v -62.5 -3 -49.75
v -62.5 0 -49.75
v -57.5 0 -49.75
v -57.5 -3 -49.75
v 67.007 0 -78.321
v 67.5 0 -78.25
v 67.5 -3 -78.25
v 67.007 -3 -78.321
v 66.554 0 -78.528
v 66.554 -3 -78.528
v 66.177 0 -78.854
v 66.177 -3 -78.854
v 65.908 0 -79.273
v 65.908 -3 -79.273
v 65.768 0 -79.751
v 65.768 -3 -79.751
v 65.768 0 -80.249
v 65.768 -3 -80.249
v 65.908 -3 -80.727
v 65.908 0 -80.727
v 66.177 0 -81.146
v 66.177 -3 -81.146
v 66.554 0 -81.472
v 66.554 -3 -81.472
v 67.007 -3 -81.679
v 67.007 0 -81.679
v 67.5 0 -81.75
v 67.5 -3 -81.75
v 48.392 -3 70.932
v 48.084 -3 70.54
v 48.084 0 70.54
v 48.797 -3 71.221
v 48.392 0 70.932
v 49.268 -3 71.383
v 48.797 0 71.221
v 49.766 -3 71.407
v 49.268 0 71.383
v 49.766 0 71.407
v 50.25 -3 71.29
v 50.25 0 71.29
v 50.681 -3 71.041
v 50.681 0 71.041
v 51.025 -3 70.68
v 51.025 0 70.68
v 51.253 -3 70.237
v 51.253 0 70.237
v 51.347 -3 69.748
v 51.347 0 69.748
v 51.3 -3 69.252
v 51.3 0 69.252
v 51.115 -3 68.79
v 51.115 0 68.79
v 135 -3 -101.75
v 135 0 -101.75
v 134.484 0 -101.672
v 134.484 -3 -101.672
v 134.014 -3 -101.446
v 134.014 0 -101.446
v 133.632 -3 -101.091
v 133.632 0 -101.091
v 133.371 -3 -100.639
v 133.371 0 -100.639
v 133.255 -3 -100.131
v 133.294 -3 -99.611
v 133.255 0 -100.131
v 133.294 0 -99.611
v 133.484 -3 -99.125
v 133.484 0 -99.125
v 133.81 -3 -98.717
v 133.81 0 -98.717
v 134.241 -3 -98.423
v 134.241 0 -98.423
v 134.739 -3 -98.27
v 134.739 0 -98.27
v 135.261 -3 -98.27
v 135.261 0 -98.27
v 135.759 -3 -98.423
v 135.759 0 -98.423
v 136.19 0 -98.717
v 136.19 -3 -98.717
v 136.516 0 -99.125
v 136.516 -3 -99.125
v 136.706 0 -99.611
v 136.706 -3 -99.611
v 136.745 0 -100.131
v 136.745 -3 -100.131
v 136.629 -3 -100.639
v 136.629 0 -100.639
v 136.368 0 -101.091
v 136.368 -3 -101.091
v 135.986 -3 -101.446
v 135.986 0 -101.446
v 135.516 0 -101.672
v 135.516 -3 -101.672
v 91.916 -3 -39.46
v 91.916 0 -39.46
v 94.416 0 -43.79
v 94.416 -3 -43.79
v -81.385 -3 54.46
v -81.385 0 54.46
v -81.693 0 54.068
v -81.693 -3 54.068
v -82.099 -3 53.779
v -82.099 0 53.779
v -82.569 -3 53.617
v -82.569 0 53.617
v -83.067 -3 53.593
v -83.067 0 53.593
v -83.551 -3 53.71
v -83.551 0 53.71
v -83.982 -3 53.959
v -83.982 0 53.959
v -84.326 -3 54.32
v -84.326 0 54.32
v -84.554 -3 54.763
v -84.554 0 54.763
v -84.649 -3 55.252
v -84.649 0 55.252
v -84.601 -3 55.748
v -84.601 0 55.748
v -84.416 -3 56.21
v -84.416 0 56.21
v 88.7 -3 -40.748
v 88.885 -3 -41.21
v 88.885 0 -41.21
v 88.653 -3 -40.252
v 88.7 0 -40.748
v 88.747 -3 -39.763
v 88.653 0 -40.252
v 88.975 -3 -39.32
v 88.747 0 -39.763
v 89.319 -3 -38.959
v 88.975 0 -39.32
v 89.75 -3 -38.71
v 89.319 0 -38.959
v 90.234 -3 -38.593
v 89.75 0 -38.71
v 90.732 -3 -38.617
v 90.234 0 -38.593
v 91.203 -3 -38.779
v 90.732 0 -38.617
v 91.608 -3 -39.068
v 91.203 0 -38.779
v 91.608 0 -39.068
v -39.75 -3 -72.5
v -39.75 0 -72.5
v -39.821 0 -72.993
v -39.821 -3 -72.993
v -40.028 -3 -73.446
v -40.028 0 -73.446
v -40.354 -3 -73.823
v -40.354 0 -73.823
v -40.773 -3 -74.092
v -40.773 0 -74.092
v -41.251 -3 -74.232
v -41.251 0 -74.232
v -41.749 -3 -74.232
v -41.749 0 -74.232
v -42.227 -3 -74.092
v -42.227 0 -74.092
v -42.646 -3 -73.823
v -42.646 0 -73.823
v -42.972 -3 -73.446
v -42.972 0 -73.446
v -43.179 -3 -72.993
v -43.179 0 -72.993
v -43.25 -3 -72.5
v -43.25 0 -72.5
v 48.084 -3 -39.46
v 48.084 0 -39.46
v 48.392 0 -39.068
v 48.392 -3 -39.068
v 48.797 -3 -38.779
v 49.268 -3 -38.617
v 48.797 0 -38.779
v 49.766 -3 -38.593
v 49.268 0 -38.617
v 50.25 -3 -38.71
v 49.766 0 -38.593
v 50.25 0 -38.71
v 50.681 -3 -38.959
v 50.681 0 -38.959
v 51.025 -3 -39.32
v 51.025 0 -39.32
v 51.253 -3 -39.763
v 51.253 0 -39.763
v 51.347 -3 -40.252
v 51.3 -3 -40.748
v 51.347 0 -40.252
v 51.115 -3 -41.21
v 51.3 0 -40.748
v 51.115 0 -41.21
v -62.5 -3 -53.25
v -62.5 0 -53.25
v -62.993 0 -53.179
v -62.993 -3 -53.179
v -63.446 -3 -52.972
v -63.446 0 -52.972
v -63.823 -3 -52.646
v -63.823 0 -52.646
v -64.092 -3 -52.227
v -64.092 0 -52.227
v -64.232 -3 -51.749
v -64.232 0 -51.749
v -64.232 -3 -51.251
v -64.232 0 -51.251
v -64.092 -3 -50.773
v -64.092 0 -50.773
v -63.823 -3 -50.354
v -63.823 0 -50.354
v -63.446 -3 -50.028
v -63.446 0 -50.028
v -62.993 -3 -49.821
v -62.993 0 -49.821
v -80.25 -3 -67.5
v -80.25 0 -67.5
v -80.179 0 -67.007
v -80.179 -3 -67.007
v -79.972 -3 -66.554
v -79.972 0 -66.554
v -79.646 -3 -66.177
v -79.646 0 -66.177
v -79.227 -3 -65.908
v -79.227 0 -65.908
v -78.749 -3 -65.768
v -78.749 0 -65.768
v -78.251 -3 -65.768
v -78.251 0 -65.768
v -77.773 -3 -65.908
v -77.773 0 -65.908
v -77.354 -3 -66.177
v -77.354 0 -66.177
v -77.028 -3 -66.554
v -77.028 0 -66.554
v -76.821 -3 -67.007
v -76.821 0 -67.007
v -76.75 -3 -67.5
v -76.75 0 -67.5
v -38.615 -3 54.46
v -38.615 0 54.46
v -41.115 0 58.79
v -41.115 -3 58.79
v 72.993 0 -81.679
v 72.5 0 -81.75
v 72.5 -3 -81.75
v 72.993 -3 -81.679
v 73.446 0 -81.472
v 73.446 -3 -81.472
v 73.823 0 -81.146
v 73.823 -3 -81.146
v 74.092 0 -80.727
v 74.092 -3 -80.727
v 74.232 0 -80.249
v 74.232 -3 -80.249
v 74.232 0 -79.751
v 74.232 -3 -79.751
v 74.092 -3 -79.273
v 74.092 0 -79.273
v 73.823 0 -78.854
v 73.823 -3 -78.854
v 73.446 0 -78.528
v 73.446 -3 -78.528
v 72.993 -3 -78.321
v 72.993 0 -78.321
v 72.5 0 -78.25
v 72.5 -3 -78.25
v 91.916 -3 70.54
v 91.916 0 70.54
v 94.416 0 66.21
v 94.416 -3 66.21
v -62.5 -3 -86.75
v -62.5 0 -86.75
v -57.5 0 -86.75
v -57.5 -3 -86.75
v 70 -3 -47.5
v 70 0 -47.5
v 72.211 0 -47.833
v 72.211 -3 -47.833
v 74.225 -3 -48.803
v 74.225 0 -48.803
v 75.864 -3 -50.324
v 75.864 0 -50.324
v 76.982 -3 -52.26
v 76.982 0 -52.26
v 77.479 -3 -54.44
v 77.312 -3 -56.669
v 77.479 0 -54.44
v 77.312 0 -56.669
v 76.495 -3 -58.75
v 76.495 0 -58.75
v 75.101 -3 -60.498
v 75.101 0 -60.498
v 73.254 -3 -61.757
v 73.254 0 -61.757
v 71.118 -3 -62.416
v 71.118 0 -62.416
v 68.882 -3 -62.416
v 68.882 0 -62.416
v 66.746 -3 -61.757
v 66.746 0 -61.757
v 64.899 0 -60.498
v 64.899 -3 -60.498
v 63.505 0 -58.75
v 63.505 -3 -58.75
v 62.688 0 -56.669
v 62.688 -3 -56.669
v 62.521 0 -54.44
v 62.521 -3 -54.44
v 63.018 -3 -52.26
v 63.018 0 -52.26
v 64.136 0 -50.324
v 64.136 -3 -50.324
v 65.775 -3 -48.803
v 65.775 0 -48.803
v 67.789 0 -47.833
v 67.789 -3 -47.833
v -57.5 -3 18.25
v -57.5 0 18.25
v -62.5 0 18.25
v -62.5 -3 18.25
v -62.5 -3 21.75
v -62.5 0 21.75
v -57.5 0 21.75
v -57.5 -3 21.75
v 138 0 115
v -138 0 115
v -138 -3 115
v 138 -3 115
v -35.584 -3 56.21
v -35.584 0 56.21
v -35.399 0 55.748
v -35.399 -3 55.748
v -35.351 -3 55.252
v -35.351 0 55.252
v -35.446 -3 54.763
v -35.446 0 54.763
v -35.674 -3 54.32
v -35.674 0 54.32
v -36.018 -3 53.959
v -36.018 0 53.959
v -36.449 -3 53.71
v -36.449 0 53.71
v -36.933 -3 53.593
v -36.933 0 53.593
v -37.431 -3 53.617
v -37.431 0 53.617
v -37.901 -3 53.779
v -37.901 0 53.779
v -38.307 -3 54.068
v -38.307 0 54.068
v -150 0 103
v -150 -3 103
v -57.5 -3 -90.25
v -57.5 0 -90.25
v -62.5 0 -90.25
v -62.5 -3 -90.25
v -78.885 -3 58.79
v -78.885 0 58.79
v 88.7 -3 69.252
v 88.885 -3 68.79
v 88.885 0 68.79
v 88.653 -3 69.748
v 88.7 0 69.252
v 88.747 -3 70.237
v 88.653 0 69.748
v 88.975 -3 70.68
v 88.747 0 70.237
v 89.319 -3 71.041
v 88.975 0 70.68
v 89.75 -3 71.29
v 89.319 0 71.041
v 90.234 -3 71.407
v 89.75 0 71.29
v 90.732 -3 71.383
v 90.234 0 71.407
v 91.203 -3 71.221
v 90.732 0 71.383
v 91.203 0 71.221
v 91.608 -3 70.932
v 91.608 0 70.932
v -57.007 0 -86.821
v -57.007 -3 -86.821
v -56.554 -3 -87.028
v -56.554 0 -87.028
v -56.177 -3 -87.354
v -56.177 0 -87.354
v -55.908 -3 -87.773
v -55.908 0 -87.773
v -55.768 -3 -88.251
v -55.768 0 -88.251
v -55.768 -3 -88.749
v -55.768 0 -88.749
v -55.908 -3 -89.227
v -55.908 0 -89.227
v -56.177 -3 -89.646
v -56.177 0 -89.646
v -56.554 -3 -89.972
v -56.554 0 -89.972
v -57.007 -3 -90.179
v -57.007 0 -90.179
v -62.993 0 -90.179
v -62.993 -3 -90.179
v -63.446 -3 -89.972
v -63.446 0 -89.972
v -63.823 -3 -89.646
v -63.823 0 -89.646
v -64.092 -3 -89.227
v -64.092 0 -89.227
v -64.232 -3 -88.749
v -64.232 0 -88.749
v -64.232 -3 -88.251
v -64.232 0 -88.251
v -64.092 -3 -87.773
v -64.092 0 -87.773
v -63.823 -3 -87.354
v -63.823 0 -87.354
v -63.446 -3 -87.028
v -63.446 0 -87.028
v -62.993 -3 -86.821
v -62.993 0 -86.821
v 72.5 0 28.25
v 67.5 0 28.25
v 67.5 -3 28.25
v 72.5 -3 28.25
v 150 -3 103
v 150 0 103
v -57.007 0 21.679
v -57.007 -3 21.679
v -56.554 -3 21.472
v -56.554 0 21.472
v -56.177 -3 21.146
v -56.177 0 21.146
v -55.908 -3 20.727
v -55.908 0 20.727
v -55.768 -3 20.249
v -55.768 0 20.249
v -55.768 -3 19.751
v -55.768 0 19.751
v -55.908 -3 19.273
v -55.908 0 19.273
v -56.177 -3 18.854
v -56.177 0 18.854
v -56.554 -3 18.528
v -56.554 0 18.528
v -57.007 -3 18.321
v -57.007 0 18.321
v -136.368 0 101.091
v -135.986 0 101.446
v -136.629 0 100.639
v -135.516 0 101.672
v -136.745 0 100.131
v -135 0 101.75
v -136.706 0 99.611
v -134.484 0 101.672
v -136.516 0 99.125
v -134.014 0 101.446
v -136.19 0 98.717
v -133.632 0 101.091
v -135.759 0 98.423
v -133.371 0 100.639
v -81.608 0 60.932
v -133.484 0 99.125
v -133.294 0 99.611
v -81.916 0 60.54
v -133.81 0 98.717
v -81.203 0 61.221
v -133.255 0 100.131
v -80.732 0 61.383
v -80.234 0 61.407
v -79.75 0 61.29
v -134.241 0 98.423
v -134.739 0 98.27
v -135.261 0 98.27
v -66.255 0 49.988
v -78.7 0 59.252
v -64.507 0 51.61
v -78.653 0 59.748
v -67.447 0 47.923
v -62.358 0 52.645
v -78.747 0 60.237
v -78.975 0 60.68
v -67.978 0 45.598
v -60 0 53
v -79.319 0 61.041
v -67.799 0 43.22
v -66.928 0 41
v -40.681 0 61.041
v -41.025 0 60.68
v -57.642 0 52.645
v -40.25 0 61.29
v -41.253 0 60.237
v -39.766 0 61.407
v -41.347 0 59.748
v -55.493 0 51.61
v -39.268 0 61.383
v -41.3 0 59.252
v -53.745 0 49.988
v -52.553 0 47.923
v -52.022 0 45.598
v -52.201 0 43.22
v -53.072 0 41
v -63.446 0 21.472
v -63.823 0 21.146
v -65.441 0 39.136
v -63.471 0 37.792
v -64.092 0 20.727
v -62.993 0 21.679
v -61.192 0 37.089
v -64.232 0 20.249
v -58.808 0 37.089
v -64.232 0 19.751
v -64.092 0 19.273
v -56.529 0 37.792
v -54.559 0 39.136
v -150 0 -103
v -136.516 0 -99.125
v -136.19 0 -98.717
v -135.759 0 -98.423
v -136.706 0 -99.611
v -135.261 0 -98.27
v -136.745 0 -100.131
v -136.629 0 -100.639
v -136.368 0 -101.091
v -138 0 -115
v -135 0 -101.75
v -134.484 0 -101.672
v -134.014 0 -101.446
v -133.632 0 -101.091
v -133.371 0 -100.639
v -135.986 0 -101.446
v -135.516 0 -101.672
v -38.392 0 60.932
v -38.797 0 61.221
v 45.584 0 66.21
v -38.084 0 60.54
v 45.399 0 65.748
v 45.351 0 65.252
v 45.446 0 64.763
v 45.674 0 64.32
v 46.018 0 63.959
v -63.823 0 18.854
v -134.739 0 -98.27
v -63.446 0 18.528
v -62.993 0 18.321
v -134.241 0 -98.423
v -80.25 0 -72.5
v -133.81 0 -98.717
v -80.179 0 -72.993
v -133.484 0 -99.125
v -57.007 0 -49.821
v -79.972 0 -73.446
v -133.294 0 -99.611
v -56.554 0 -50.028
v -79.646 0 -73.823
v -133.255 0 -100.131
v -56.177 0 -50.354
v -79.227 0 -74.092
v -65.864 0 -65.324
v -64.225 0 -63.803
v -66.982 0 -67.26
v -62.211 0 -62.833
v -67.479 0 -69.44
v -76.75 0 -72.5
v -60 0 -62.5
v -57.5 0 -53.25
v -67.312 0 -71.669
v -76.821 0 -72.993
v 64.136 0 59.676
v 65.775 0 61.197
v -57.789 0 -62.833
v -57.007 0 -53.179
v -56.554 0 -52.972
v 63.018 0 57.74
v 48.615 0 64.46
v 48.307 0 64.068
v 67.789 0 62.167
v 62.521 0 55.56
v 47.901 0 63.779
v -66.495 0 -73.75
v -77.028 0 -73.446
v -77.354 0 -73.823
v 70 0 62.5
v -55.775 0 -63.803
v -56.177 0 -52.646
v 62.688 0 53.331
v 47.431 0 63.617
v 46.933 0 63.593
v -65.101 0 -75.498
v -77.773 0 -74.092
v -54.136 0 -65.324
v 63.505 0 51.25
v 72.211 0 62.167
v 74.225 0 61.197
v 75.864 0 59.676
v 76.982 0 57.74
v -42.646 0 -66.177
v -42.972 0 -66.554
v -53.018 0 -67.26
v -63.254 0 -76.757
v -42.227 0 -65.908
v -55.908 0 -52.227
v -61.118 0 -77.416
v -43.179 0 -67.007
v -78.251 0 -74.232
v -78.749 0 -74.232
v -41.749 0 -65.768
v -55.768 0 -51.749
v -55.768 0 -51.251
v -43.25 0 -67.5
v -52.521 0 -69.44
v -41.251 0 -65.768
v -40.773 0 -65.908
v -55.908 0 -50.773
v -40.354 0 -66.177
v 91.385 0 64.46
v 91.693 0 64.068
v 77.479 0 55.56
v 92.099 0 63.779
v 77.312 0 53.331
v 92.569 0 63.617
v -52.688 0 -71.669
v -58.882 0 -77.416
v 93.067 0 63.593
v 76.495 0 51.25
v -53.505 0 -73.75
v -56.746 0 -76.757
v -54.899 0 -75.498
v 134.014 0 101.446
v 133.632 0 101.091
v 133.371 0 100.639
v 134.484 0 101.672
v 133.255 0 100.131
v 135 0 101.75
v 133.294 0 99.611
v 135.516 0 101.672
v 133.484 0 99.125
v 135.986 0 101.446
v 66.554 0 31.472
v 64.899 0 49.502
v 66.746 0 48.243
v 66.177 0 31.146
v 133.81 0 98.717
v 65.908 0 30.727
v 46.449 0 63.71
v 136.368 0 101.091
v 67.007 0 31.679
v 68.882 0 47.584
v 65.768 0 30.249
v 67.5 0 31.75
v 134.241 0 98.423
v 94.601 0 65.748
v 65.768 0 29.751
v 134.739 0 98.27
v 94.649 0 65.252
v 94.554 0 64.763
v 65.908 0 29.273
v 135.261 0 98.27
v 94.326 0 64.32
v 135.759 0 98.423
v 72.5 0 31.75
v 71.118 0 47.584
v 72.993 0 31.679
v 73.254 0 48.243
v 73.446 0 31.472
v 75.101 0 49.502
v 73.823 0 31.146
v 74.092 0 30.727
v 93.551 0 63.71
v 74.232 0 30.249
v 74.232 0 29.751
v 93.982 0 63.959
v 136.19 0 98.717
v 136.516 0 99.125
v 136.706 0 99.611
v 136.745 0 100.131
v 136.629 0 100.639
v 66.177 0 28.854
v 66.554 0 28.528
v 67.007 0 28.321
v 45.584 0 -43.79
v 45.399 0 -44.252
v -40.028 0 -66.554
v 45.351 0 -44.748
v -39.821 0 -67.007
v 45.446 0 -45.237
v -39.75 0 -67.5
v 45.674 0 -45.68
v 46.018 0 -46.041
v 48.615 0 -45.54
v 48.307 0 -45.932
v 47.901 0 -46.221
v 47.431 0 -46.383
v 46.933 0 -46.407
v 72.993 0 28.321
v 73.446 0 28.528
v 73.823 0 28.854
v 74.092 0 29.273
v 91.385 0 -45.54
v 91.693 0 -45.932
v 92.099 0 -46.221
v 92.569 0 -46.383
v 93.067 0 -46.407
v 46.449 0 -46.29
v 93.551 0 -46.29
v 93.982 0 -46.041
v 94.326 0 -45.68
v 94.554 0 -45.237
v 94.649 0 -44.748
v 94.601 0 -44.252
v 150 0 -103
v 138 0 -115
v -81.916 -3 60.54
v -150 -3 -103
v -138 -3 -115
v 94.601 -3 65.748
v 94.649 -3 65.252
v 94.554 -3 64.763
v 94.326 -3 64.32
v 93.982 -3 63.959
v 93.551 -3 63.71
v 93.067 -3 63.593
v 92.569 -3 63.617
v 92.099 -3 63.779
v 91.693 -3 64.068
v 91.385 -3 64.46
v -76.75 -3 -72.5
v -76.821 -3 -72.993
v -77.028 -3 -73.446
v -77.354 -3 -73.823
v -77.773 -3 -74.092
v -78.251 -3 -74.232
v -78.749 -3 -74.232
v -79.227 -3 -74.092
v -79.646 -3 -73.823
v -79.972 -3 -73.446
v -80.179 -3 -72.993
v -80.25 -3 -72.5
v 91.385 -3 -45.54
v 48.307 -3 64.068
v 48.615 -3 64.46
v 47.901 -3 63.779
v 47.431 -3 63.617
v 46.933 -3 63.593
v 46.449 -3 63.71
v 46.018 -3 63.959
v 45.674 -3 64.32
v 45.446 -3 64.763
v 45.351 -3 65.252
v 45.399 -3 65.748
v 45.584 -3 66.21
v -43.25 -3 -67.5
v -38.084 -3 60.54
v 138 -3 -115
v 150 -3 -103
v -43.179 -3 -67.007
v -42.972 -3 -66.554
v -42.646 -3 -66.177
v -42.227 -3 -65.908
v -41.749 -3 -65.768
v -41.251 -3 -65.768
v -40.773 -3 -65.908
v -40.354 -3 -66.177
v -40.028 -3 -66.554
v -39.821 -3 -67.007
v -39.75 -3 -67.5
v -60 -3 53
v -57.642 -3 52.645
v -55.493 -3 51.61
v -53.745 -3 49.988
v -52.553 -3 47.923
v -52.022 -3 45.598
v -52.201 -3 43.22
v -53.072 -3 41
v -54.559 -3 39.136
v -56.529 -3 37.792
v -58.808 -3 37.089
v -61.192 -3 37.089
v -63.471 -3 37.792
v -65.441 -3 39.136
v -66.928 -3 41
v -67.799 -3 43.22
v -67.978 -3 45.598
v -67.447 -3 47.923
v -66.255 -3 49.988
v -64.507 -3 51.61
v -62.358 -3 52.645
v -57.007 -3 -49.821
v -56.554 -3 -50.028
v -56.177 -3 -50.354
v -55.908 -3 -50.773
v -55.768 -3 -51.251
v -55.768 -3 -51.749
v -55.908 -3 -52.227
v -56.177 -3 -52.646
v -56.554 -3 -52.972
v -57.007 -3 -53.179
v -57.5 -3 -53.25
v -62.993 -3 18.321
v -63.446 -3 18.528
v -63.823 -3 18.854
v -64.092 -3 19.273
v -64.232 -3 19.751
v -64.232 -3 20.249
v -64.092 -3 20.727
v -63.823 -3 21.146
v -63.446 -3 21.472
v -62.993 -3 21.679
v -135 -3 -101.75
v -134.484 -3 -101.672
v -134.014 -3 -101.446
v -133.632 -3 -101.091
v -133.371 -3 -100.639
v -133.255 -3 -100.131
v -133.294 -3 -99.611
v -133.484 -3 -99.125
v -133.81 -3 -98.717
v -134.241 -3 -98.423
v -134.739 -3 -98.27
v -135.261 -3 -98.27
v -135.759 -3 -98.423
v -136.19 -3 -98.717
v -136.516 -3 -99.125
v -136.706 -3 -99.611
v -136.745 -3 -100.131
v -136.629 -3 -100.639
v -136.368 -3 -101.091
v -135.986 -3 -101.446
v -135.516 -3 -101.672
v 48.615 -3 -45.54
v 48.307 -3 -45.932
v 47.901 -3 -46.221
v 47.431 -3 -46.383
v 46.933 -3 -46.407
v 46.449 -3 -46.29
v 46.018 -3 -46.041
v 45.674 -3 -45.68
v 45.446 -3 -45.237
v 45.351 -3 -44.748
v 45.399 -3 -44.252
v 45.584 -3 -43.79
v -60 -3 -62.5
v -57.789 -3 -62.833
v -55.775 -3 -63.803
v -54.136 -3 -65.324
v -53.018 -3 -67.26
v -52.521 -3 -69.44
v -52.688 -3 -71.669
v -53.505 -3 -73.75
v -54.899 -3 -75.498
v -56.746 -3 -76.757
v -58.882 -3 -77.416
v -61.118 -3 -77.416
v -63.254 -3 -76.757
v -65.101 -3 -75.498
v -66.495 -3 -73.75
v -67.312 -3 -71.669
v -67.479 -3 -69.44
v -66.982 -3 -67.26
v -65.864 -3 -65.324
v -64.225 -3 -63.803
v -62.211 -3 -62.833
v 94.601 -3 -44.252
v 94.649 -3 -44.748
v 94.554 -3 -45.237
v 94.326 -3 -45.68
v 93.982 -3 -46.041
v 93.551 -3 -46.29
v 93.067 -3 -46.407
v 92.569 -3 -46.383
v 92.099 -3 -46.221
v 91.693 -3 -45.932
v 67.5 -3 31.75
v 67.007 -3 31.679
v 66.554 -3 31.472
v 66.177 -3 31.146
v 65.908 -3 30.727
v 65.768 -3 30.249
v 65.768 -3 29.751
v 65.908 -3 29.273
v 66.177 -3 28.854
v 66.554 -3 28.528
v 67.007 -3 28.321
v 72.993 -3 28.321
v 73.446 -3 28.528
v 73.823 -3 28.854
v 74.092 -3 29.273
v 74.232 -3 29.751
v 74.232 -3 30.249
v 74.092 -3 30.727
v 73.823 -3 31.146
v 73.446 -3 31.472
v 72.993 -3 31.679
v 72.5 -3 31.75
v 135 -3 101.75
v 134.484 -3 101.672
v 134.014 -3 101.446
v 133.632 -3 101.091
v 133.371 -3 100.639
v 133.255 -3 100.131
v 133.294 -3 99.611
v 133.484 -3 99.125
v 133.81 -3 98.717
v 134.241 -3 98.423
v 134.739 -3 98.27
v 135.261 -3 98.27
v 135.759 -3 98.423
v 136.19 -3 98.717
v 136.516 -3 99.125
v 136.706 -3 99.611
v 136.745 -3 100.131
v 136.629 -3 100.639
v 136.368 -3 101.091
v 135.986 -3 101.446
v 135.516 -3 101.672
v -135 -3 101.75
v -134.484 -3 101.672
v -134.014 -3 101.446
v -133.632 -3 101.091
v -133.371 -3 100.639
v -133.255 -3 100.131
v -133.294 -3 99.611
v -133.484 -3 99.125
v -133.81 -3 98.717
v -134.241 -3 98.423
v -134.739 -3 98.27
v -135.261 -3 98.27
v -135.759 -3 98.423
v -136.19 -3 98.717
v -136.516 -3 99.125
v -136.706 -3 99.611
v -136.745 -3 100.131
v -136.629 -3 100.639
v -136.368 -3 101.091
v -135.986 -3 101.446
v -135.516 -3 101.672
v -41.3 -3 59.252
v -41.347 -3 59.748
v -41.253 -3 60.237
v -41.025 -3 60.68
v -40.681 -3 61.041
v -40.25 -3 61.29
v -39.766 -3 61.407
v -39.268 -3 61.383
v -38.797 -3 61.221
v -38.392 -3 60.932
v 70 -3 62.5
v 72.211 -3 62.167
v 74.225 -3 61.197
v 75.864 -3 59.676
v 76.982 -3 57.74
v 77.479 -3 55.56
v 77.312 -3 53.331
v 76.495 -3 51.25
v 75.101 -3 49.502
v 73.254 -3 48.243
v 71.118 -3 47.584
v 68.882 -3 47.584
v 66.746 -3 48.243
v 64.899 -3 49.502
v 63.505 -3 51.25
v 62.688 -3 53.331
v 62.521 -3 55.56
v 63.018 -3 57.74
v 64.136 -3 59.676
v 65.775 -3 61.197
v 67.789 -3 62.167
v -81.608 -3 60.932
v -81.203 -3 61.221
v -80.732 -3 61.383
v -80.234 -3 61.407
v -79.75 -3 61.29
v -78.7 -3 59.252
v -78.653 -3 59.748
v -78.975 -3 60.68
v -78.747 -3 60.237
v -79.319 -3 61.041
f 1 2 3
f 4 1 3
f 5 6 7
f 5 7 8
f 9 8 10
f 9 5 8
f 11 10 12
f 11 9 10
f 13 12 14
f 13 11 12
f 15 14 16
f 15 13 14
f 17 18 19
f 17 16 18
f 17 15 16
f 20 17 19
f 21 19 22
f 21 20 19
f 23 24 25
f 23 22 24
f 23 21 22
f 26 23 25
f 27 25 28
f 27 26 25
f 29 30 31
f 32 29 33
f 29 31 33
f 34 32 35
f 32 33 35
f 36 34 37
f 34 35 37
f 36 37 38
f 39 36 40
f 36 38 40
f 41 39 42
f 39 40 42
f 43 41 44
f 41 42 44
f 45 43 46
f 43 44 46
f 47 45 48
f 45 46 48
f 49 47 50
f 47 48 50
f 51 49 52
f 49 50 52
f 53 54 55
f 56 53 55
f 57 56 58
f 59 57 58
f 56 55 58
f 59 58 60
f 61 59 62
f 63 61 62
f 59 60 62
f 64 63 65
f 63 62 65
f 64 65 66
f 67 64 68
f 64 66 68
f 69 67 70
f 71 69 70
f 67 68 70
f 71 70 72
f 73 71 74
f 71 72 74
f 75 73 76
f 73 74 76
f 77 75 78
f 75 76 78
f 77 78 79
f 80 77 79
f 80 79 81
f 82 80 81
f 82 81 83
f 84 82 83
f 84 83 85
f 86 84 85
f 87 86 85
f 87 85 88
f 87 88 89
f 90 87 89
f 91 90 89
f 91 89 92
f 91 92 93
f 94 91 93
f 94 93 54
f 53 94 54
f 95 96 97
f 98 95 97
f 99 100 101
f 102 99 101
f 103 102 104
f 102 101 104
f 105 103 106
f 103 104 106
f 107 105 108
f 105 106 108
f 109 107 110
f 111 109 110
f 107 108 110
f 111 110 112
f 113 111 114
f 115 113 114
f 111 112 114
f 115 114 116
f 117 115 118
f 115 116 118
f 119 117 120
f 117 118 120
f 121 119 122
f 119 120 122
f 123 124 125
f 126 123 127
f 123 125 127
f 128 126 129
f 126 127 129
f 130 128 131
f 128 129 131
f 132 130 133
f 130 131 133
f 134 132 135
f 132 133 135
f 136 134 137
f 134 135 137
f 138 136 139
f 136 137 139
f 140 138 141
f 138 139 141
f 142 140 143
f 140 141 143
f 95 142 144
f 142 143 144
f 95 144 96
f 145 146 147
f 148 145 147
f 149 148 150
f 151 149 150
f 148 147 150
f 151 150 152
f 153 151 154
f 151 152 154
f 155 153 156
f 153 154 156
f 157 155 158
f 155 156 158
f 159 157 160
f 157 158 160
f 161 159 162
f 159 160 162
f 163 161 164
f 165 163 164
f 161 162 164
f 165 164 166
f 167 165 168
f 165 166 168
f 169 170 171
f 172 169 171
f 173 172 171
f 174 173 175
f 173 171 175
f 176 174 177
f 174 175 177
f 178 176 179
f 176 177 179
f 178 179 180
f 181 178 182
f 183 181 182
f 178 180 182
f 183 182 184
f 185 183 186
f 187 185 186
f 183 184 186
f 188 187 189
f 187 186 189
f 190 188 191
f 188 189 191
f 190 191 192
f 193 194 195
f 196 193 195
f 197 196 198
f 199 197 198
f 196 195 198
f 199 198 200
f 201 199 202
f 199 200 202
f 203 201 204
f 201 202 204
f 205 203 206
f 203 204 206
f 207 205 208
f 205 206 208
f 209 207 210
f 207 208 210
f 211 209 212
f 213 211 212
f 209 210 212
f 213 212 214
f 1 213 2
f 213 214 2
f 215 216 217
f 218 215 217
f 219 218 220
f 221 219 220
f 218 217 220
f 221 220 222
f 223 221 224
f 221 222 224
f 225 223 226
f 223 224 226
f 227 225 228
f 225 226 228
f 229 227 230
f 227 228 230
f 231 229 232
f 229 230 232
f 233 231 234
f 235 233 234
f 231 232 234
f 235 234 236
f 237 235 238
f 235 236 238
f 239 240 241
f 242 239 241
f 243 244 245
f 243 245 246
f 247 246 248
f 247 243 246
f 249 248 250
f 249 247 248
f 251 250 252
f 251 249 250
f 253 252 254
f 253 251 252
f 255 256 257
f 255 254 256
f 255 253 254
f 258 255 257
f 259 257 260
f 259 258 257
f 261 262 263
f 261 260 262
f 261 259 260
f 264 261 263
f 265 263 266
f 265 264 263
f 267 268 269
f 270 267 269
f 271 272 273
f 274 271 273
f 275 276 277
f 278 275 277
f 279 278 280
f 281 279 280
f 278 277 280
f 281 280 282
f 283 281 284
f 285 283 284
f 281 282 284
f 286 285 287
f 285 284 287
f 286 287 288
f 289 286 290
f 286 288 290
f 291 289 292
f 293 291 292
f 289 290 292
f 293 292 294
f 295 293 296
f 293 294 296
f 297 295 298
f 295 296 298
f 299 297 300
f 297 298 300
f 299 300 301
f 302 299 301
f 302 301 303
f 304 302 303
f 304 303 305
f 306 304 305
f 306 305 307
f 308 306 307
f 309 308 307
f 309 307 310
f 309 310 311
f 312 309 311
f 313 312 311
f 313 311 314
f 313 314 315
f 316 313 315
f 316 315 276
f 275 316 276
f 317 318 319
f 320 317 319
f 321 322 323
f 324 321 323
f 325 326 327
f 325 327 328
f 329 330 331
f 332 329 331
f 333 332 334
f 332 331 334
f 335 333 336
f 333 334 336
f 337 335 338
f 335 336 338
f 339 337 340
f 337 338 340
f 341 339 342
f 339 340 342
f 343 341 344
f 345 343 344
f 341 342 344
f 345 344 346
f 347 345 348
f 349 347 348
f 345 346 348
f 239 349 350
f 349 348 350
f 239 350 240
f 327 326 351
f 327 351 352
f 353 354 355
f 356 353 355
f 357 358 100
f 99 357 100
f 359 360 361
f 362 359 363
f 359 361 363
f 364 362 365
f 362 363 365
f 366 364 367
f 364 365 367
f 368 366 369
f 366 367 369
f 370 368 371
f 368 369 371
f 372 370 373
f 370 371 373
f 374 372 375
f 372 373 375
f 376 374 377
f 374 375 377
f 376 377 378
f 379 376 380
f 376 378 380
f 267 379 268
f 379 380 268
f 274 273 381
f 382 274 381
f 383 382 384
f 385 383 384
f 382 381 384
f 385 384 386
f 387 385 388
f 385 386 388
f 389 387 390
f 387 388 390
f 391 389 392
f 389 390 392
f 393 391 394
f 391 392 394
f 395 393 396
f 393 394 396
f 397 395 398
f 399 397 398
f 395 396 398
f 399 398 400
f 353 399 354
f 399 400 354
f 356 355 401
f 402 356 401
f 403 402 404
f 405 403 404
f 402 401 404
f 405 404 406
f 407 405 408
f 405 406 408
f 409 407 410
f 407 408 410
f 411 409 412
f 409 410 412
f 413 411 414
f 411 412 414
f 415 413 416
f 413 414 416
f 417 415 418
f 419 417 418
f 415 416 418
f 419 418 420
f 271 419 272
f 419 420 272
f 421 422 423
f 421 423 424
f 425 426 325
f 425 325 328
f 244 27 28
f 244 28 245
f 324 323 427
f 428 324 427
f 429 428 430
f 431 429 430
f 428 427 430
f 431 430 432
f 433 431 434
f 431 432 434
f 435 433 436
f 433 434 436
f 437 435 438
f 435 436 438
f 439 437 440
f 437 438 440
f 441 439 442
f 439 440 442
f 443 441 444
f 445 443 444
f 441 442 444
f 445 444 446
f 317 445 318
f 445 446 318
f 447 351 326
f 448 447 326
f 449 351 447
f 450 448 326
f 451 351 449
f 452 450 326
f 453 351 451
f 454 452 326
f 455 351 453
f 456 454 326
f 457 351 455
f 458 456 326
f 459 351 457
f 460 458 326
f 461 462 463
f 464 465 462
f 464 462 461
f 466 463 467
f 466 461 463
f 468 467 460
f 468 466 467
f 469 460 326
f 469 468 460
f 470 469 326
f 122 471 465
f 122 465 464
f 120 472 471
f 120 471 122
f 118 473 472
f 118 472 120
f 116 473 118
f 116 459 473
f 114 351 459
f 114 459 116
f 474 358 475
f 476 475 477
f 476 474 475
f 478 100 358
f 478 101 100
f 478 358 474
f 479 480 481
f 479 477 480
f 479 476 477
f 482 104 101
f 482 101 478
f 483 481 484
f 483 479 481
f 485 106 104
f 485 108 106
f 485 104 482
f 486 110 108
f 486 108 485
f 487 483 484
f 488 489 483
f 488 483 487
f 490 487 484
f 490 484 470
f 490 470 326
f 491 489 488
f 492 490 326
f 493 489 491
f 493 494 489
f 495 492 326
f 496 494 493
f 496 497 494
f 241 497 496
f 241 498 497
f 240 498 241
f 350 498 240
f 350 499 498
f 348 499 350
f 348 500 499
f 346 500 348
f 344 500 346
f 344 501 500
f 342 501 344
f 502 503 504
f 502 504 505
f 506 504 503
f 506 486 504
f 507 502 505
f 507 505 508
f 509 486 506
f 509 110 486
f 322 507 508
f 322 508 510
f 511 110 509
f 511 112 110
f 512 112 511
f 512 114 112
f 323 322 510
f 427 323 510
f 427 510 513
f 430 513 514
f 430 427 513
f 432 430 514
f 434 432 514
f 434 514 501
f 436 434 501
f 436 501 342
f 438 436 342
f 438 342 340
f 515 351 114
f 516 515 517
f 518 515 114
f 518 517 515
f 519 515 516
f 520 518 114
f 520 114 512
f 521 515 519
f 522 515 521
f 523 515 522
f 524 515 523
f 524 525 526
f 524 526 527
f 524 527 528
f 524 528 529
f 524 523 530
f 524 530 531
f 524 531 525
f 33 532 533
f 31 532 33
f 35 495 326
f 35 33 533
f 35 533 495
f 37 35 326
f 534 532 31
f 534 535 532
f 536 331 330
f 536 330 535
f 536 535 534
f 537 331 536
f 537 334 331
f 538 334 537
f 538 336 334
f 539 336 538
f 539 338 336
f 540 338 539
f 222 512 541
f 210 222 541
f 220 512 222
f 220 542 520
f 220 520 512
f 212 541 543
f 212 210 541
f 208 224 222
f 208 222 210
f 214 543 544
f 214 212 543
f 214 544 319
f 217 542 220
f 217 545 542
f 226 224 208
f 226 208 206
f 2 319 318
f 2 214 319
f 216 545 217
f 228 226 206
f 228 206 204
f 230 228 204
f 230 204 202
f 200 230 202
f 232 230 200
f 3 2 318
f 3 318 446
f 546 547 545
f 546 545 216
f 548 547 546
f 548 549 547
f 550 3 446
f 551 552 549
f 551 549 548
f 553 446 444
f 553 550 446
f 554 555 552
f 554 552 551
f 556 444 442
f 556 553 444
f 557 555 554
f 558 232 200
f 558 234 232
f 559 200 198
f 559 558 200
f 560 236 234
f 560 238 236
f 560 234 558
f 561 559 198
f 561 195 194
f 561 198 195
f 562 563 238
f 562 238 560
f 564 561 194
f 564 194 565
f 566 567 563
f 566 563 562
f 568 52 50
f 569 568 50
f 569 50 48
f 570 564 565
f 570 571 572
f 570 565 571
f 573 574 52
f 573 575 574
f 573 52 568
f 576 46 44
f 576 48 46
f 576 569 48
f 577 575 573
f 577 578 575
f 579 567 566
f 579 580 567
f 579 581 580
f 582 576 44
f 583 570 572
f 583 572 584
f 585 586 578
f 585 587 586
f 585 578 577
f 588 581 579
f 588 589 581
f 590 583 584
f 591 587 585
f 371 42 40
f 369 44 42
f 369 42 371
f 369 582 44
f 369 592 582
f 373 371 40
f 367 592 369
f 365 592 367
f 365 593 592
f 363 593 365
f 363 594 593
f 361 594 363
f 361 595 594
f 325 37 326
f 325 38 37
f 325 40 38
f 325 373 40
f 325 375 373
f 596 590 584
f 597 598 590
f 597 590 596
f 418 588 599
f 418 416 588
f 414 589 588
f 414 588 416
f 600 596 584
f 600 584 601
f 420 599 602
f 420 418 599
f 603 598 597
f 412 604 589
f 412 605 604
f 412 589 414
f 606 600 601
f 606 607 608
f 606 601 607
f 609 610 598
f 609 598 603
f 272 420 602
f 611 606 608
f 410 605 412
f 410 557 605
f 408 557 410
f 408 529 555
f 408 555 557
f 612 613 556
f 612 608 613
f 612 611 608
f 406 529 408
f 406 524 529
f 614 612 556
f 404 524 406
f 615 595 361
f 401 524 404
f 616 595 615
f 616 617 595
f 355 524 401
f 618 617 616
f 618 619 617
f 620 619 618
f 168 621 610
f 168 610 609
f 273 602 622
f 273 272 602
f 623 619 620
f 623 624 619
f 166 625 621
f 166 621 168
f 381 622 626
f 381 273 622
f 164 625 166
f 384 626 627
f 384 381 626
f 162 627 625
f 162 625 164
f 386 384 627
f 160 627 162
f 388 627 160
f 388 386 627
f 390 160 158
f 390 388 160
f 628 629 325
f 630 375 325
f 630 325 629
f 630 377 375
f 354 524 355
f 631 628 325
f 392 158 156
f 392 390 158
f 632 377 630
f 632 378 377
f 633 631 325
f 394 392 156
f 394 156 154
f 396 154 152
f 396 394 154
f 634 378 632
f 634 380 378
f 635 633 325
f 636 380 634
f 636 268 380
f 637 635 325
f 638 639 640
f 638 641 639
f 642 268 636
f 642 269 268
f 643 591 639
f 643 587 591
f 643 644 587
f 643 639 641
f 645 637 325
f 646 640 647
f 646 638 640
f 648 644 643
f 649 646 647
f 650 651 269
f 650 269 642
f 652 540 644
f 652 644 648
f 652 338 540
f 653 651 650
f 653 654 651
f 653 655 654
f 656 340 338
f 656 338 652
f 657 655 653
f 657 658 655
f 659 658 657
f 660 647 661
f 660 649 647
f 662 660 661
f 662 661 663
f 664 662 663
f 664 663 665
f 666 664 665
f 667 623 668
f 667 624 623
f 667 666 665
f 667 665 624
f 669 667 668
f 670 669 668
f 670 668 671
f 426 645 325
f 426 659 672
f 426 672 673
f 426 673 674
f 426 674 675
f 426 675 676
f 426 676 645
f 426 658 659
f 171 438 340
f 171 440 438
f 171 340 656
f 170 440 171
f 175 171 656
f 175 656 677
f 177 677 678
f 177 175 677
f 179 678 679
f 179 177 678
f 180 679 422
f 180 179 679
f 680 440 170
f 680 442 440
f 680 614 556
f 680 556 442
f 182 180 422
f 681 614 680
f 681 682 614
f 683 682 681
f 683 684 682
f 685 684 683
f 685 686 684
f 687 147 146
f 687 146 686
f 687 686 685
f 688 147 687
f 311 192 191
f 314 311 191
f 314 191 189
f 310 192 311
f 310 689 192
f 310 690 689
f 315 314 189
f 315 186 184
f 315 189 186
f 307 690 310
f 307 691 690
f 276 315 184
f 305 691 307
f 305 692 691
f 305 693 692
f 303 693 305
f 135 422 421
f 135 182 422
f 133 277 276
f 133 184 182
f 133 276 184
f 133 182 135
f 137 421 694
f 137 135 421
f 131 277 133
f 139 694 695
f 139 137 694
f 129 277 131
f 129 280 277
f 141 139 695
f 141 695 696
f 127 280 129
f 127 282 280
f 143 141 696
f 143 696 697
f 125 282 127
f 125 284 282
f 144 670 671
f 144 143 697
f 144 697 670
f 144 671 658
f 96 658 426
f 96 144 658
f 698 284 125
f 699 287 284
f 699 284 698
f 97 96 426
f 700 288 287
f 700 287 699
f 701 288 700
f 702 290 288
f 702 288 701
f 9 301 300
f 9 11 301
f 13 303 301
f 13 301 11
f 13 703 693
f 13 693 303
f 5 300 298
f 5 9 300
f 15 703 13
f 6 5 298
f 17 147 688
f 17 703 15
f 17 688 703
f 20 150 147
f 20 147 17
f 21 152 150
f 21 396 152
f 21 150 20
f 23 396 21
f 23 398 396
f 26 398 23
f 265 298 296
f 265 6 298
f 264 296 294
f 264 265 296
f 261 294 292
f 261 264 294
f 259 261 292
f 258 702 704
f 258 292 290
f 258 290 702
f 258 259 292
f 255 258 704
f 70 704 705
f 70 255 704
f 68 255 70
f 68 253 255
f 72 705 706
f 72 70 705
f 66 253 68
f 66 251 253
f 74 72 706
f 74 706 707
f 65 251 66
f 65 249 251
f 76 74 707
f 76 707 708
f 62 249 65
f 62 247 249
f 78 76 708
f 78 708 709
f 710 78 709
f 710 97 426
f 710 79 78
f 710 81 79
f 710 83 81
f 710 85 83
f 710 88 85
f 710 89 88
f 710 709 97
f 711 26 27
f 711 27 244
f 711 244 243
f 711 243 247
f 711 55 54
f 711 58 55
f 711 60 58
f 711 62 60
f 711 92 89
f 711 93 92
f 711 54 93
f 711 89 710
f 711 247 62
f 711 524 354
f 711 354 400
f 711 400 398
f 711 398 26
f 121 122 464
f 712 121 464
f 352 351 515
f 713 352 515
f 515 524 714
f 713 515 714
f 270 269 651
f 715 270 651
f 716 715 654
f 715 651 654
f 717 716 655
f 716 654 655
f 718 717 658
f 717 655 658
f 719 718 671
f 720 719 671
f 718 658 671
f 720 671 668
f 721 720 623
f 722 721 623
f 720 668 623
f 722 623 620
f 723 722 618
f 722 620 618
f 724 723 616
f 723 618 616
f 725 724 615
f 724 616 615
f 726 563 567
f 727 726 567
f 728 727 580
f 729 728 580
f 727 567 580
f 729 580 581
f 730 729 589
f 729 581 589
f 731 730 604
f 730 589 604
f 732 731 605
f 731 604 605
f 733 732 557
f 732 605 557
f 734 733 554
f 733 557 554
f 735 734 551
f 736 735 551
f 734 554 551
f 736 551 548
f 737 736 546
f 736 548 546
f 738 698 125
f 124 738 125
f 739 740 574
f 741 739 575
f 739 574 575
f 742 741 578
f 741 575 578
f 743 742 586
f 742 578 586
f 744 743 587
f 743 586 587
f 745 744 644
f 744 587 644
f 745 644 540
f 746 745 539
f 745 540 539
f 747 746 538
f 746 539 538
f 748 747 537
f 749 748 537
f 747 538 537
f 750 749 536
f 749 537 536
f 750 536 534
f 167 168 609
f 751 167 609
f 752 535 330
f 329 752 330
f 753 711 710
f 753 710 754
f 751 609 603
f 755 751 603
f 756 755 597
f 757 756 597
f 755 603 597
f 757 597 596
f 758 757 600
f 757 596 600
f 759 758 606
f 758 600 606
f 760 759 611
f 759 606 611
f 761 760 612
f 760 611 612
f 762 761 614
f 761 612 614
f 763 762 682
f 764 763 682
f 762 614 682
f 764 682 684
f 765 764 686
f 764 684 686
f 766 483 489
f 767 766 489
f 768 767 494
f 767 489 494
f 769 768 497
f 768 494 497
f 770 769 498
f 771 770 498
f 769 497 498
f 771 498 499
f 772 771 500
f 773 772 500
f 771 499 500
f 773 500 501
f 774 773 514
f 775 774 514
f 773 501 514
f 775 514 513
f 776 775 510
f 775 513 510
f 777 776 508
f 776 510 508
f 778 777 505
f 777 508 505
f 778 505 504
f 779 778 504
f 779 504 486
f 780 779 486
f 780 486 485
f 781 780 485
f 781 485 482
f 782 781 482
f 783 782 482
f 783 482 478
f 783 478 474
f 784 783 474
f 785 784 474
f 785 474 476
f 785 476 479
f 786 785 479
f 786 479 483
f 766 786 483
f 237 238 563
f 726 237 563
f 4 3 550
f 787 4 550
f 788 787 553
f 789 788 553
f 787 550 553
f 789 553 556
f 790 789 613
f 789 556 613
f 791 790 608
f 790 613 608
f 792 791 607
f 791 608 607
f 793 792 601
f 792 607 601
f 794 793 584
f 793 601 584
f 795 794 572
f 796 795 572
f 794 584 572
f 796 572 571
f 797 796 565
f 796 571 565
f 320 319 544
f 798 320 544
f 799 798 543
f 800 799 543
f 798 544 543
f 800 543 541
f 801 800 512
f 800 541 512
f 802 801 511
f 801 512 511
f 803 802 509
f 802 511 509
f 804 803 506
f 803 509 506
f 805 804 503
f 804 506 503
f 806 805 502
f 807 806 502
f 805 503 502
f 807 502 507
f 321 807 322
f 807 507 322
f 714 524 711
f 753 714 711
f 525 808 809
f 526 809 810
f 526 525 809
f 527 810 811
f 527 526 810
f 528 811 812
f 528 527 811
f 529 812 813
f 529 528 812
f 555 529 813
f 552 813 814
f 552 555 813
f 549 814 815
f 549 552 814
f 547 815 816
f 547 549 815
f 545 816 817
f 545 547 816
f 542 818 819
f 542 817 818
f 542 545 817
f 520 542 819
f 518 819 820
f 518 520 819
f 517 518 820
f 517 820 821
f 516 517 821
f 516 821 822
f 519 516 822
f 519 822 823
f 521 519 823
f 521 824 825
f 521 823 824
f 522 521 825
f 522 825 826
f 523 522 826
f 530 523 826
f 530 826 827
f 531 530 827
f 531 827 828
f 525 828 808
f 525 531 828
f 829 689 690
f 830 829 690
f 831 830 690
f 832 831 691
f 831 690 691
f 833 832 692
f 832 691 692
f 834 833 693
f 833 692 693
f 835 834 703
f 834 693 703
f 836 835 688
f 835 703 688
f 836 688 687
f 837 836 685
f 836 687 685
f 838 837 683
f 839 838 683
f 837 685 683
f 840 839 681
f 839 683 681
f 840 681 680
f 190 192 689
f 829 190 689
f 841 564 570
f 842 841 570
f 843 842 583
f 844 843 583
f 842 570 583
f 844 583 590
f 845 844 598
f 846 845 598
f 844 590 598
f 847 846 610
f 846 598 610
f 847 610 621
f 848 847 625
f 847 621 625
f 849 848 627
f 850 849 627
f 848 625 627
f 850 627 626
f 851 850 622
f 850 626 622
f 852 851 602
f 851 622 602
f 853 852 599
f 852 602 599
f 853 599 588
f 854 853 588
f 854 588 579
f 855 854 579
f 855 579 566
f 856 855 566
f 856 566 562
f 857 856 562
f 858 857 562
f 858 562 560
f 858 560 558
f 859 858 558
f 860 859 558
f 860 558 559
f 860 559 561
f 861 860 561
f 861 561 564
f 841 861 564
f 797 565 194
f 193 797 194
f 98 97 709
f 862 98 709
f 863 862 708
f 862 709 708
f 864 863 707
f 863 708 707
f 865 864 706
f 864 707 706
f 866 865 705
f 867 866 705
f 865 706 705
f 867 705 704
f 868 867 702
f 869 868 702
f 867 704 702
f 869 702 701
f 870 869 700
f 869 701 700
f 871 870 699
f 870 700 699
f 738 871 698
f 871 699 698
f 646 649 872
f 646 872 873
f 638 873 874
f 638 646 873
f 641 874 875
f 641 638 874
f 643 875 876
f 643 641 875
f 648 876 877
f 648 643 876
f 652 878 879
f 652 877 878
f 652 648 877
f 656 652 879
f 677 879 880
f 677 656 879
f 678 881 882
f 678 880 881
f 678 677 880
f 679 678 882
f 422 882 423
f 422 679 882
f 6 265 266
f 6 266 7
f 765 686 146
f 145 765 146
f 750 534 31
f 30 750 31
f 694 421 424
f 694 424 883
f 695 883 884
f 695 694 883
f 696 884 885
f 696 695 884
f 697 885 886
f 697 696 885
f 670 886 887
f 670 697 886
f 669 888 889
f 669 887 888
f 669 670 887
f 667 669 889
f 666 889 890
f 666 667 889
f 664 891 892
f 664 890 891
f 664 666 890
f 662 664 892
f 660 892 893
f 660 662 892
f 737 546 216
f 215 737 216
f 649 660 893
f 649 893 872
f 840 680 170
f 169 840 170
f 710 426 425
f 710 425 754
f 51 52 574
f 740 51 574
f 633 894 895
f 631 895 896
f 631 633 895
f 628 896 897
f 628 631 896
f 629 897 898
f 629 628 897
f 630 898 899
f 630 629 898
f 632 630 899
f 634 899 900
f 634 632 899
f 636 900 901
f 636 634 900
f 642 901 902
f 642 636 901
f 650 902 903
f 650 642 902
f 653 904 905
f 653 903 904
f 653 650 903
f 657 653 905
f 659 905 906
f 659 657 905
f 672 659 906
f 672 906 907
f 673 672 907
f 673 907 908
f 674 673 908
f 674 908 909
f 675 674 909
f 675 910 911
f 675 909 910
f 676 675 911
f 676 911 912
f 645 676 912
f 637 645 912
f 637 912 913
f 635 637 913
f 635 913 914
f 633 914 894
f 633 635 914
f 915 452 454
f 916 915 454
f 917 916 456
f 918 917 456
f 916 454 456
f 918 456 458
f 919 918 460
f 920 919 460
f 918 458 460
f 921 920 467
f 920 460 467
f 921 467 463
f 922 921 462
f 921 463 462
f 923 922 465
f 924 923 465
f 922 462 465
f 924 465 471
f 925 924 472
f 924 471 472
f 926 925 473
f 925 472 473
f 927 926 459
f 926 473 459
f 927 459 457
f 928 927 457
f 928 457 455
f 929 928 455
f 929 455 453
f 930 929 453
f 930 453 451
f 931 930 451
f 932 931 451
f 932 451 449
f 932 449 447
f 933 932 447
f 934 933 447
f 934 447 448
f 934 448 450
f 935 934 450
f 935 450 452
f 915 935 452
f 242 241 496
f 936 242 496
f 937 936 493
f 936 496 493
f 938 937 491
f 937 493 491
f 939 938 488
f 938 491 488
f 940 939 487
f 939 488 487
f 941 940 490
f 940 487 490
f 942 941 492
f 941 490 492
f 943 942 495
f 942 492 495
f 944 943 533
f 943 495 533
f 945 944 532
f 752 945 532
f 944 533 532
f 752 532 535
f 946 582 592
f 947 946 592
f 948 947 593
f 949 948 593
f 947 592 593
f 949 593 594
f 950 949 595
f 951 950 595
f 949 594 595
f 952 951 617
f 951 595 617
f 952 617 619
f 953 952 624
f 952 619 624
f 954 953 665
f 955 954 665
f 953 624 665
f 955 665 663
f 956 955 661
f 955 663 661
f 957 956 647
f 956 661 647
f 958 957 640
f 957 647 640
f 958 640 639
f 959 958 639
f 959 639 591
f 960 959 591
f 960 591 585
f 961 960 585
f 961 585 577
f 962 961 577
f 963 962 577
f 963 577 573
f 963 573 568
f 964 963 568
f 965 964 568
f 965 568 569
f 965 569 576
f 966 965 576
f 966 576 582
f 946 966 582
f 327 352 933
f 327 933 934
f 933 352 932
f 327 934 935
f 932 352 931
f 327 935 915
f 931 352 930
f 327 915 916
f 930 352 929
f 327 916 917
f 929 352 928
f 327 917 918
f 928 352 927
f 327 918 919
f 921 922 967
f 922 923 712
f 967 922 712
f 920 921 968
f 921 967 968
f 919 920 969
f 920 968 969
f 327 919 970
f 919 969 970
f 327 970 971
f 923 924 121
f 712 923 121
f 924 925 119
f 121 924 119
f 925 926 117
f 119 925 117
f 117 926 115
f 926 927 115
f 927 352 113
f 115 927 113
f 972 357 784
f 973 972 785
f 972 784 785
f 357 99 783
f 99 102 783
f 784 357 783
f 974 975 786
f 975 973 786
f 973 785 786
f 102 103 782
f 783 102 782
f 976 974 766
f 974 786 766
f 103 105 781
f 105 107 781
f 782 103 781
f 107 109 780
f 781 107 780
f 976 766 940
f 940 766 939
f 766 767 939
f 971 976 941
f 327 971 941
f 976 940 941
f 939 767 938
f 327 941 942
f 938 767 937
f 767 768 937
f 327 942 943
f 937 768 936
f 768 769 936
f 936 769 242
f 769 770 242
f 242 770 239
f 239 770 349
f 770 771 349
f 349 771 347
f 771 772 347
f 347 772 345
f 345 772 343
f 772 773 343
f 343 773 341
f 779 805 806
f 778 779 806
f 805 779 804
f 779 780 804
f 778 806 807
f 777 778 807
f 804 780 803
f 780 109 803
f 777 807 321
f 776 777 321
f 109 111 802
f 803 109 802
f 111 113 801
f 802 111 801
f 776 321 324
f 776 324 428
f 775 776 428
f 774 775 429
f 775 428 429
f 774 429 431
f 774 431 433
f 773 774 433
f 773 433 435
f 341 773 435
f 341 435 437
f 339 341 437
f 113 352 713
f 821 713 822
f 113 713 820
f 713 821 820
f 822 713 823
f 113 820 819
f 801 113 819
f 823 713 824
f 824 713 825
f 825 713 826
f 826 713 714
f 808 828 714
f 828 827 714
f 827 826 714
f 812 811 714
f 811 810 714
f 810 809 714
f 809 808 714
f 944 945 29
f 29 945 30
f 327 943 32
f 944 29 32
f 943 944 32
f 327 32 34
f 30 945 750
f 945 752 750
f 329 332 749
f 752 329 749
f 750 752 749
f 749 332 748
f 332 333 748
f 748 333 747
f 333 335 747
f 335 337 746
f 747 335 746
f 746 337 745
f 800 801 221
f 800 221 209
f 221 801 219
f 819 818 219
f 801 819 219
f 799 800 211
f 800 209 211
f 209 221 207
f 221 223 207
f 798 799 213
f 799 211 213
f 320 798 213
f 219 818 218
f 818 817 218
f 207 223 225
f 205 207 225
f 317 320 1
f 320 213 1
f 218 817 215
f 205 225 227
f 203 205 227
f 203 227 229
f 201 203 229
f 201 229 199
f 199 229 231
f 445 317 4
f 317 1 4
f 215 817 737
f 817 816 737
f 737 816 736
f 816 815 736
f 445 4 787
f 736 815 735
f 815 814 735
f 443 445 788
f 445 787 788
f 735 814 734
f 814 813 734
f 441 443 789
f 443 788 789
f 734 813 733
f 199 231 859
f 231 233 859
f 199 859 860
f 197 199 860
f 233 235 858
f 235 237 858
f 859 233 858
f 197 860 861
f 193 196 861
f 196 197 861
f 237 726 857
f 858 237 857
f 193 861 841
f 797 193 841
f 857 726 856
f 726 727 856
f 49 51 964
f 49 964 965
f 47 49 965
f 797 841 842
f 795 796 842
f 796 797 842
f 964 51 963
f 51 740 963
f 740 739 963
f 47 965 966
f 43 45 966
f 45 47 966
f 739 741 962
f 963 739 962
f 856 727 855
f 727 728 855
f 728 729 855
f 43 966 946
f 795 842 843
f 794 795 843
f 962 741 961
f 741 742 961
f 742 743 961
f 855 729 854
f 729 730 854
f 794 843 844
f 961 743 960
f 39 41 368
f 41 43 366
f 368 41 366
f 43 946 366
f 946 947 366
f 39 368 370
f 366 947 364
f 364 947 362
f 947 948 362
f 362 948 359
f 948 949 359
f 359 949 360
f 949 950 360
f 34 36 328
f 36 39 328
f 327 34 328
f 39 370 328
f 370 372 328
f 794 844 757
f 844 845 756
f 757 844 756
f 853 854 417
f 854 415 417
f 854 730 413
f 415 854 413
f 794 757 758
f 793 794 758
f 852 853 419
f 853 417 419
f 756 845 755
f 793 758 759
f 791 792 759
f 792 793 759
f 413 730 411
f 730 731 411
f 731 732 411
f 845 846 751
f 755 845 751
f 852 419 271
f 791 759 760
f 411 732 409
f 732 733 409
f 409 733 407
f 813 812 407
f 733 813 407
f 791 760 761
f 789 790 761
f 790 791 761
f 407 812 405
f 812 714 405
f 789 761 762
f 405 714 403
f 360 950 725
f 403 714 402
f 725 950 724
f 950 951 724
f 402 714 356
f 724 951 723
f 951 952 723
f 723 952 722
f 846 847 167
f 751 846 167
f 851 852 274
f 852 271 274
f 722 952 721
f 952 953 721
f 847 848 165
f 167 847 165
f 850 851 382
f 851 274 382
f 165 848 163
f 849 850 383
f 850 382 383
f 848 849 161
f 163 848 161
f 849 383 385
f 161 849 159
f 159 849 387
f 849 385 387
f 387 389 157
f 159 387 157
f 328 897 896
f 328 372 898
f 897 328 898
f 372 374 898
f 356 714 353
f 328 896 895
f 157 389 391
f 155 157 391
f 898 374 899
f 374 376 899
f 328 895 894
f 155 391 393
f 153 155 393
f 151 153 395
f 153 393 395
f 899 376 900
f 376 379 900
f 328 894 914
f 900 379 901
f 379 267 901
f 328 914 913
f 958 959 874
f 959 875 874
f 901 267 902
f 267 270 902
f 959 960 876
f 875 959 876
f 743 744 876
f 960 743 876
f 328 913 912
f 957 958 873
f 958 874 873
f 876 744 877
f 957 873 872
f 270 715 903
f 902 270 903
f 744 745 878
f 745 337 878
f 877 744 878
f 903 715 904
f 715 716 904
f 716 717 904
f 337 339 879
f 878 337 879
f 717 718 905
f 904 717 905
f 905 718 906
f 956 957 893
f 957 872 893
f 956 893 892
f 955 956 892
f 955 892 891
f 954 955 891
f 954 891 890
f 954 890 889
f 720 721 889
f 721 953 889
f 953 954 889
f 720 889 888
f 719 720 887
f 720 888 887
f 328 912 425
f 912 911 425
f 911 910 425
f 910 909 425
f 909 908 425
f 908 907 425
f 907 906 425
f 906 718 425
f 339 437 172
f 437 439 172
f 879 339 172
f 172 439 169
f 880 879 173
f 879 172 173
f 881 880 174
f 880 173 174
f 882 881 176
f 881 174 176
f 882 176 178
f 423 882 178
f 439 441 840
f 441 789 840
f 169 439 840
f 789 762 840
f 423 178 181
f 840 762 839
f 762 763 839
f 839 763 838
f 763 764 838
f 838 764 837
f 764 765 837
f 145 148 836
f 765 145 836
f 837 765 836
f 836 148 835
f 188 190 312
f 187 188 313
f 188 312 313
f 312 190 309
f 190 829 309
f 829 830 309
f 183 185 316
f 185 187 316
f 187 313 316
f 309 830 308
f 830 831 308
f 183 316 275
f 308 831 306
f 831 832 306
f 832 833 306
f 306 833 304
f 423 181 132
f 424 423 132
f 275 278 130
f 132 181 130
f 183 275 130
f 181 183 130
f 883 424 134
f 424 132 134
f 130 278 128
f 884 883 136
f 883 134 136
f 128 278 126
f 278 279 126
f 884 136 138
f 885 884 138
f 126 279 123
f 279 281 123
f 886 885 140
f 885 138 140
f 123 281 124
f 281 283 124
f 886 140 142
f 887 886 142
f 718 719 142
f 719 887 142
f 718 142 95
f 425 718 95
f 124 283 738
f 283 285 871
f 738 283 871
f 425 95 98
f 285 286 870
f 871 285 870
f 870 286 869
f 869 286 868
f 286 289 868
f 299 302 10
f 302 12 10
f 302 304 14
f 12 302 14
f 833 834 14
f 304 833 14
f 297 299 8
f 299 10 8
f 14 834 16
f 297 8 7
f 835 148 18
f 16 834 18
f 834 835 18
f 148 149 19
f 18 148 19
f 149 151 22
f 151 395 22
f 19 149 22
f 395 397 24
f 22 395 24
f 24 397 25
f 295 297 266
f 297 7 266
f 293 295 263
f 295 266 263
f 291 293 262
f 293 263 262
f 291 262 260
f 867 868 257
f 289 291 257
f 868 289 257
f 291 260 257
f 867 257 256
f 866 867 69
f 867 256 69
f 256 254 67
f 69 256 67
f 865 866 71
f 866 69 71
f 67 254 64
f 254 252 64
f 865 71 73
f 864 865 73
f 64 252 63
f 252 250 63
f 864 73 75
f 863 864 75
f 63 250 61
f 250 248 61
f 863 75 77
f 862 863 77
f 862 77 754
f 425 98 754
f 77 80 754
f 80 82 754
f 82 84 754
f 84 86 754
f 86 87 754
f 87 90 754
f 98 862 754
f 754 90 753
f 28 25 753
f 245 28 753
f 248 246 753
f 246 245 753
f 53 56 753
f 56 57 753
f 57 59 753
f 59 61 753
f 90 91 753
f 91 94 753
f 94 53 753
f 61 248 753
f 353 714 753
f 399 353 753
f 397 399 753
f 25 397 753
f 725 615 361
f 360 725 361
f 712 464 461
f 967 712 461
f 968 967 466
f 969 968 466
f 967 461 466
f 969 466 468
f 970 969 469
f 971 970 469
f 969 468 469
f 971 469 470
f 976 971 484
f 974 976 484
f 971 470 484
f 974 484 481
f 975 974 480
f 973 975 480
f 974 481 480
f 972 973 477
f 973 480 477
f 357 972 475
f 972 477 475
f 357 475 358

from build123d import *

# Parameters (mm, degrees)
ESBO_O1_W                 = 300
ESBO_O1_H                 = 230
RESSALTO_EXTRUS_O1_DEPTH  = 3
CHANFRO1_SIZE             = 12
ESBO_O4_R                 = 8
ESBO_O4_R_2               = 7.5
CORTE_EXTRUS_O1_DEPTH     = 190.034388406
ESBO_O5_R                 = 1.75
CORTE_EXTRUS_O2_DEPTH     = 190.034388406
ESPELHAR2_COPY_1_SKETCH_R = 1.75
ESPELHAR2_COPY_1_DEPTH    = 190.034388406


with BuildPart() as part:
    # Esboço1 → Ressalto-extrusão1 (new body)
    with BuildSketch(Plane(origin=(0, 0, 0), x_dir=(1, 0, 0), z_dir=(0, 1, 0))):
        Rectangle(ESBO_O1_W, ESBO_O1_H)
    extrude(amount=-RESSALTO_EXTRUS_O1_DEPTH)

    # Chanfro1
    chanfro1_edges = [part.edges().sort_by_distance(p)[0] for p in [
        (150, -1.5, 115),
        (-150, -1.5, 115),
        (-150, -1.5, -115),
        (150, -1.5, -115),
    ]]
    chamfer(chanfro1_edges, length=CHANFRO1_SIZE)

    # Esboço4 → Corte-extrusão1 (cut, through all)
    with BuildSketch(Plane(origin=(0, 0, 0), x_dir=(1, 0, 0), z_dir=(0, 1, 0))):
        with Locations(Location((-60, -45, 0), (0, 0, 270))):
            Circle(ESBO_O4_R)
        with Locations(Location((70, -55, 0), (0, 0, 270))):
            Circle(ESBO_O4_R_2)
        with Locations(Location((70, 55, 0), (0, 0, 270))):
            Circle(ESBO_O4_R_2)
        with Locations(Location((-60, 70, 0), (0, 0, 270))):
            Circle(ESBO_O4_R_2)
        with BuildLine():
            Line((-62.5, -21.75), (-57.5, -21.75))
            ThreePointArc((-57.5, -21.75), (-55.75, -20), (-57.5, -18.25))
            Line((-57.5, -18.25), (-62.5, -18.25))
            ThreePointArc((-62.5, -18.25), (-64.25, -20), (-62.5, -21.75))
        make_face()
        with BuildLine():
            Line((-38.614909362, -54.459936491), (-41.114909362, -58.790063509))
            ThreePointArc((-41.114909362, -58.790063509), (-40.474364905, -61.180607966), (-38.083820449, -60.540063509))
            Line((-38.083820449, -60.540063509), (-35.583820449, -56.209936491))
            ThreePointArc((-35.583820449, -56.209936491), (-36.224364905, -53.819392034), (-38.614909362, -54.459936491))
        make_face()
        with BuildLine():
            Line((-78.885090638, -58.790063509), (-81.385090638, -54.459936491))
            ThreePointArc((-81.385090638, -54.459936491), (-83.775635095, -53.819392034), (-84.416179551, -56.209936491))
            Line((-84.416179551, -56.209936491), (-81.916179551, -60.540063509))
            ThreePointArc((-81.916179551, -60.540063509), (-79.525635095, -61.180607966), (-78.885090638, -58.790063509))
        make_face()
        with BuildLine():
            Line((67.5, -28.25), (72.5, -28.25))
            ThreePointArc((72.5, -28.25), (74.25, -30), (72.5, -31.75))
            Line((72.5, -31.75), (67.5, -31.75))
            ThreePointArc((67.5, -31.75), (65.75, -30), (67.5, -28.25))
        make_face()
        with BuildLine():
            Line((91.385090638, -64.459936491), (88.885090638, -68.790063509))
            ThreePointArc((88.885090638, -68.790063509), (89.525635095, -71.180607966), (91.916179551, -70.540063509))
            Line((91.916179551, -70.540063509), (94.416179551, -66.209936491))
            ThreePointArc((94.416179551, -66.209936491), (93.775635095, -63.819392034), (91.385090638, -64.459936491))
        make_face()
        with BuildLine():
            Line((51.114909362, -68.790063509), (48.614909362, -64.459936491))
            ThreePointArc((48.614909362, -64.459936491), (46.224364905, -63.819392034), (45.583820449, -66.209936491))
            Line((45.583820449, -66.209936491), (48.083820449, -70.540063509))
            ThreePointArc((48.083820449, -70.540063509), (50.474364905, -71.180607966), (51.114909362, -68.790063509))
        make_face()
        with BuildLine():
            Line((67.5, 81.75), (72.5, 81.75))
            ThreePointArc((72.5, 81.75), (74.25, 80), (72.5, 78.25))
            Line((72.5, 78.25), (67.5, 78.25))
            ThreePointArc((67.5, 78.25), (65.75, 80), (67.5, 81.75))
        make_face()
        with BuildLine():
            Line((91.385090638, 45.540063509), (88.885090638, 41.209936491))
            ThreePointArc((88.885090638, 41.209936491), (89.525635095, 38.819392034), (91.916179551, 39.459936491))
            Line((91.916179551, 39.459936491), (94.416179551, 43.790063509))
            ThreePointArc((94.416179551, 43.790063509), (93.775635095, 46.180607966), (91.385090638, 45.540063509))
        make_face()
        with BuildLine():
            Line((51.114909362, 41.209936491), (48.614909362, 45.540063509))
            ThreePointArc((48.614909362, 45.540063509), (46.224364905, 46.180607966), (45.583820449, 43.790063509))
            Line((45.583820449, 43.790063509), (48.083820449, 39.459936491))
            ThreePointArc((48.083820449, 39.459936491), (50.474364905, 38.819392034), (51.114909362, 41.209936491))
        make_face()
        with BuildLine():
            Line((-62.5, 86.75), (-57.5, 86.75))
            ThreePointArc((-57.5, 86.75), (-55.75, 88.5), (-57.5, 90.25))
            Line((-57.5, 90.25), (-62.5, 90.25))
            ThreePointArc((-62.5, 90.25), (-64.25, 88.5), (-62.5, 86.75))
        make_face()
        with BuildLine():
            Line((-43.25, 72.5), (-43.25, 67.5))
            ThreePointArc((-43.25, 67.5), (-41.5, 65.75), (-39.75, 67.5))
            Line((-39.75, 67.5), (-39.75, 72.5))
            ThreePointArc((-39.75, 72.5), (-41.5, 74.25), (-43.25, 72.5))
        make_face()
        with BuildLine():
            Line((-57.5, 53.25), (-62.5, 53.25))
            ThreePointArc((-62.5, 53.25), (-64.25, 51.5), (-62.5, 49.75))
            Line((-62.5, 49.75), (-57.5, 49.75))
            ThreePointArc((-57.5, 49.75), (-55.75, 51.5), (-57.5, 53.25))
        make_face()
        with BuildLine():
            Line((-76.75, 67.5), (-76.75, 72.5))
            ThreePointArc((-76.75, 72.5), (-78.5, 74.25), (-80.25, 72.5))
            Line((-80.25, 72.5), (-80.25, 67.5))
            ThreePointArc((-80.25, 67.5), (-78.5, 65.75), (-76.75, 67.5))
        make_face()
    extrude(amount=-CORTE_EXTRUS_O1_DEPTH, mode=Mode.SUBTRACT)

    # Esboço5 → Corte-extrusão2 (cut, through all)
    with BuildSketch(Plane(origin=(0, 0, 0), x_dir=(1, 0, 0), z_dir=(0, 1, 0))):
        with Locations(Location((-135, -100, 0), (0, 0, 270))):
            Circle(ESBO_O5_R)
    corte_extrus_o2 = extrude(amount=-CORTE_EXTRUS_O2_DEPTH, mode=Mode.SUBTRACT)

    # Espelhar1: Corte-extrusão2 across plane
    add(corte_extrus_o2.mirror(Plane.XY), mode=Mode.SUBTRACT)

    # Espelhar2: Corte-extrusão2 across plane
    add(corte_extrus_o2.mirror(Plane(origin=(0, 0, 0), x_dir=(0, 0, 1), z_dir=(1, 0, 0))), mode=Mode.SUBTRACT)

    # Espelhar2 copy 1 sketch → Espelhar2 copy 1 (cut, through all)
    with BuildSketch(Plane(origin=(0, 0, 0), x_dir=(-1, 0, 0), z_dir=(0, 1, 0))):
        with Locations(Location((-135, -100, 0), (0, 0, 270))):
            Circle(ESPELHAR2_COPY_1_SKETCH_R)
    extrude(amount=-ESPELHAR2_COPY_1_DEPTH, mode=Mode.SUBTRACT)


solid = part.part
